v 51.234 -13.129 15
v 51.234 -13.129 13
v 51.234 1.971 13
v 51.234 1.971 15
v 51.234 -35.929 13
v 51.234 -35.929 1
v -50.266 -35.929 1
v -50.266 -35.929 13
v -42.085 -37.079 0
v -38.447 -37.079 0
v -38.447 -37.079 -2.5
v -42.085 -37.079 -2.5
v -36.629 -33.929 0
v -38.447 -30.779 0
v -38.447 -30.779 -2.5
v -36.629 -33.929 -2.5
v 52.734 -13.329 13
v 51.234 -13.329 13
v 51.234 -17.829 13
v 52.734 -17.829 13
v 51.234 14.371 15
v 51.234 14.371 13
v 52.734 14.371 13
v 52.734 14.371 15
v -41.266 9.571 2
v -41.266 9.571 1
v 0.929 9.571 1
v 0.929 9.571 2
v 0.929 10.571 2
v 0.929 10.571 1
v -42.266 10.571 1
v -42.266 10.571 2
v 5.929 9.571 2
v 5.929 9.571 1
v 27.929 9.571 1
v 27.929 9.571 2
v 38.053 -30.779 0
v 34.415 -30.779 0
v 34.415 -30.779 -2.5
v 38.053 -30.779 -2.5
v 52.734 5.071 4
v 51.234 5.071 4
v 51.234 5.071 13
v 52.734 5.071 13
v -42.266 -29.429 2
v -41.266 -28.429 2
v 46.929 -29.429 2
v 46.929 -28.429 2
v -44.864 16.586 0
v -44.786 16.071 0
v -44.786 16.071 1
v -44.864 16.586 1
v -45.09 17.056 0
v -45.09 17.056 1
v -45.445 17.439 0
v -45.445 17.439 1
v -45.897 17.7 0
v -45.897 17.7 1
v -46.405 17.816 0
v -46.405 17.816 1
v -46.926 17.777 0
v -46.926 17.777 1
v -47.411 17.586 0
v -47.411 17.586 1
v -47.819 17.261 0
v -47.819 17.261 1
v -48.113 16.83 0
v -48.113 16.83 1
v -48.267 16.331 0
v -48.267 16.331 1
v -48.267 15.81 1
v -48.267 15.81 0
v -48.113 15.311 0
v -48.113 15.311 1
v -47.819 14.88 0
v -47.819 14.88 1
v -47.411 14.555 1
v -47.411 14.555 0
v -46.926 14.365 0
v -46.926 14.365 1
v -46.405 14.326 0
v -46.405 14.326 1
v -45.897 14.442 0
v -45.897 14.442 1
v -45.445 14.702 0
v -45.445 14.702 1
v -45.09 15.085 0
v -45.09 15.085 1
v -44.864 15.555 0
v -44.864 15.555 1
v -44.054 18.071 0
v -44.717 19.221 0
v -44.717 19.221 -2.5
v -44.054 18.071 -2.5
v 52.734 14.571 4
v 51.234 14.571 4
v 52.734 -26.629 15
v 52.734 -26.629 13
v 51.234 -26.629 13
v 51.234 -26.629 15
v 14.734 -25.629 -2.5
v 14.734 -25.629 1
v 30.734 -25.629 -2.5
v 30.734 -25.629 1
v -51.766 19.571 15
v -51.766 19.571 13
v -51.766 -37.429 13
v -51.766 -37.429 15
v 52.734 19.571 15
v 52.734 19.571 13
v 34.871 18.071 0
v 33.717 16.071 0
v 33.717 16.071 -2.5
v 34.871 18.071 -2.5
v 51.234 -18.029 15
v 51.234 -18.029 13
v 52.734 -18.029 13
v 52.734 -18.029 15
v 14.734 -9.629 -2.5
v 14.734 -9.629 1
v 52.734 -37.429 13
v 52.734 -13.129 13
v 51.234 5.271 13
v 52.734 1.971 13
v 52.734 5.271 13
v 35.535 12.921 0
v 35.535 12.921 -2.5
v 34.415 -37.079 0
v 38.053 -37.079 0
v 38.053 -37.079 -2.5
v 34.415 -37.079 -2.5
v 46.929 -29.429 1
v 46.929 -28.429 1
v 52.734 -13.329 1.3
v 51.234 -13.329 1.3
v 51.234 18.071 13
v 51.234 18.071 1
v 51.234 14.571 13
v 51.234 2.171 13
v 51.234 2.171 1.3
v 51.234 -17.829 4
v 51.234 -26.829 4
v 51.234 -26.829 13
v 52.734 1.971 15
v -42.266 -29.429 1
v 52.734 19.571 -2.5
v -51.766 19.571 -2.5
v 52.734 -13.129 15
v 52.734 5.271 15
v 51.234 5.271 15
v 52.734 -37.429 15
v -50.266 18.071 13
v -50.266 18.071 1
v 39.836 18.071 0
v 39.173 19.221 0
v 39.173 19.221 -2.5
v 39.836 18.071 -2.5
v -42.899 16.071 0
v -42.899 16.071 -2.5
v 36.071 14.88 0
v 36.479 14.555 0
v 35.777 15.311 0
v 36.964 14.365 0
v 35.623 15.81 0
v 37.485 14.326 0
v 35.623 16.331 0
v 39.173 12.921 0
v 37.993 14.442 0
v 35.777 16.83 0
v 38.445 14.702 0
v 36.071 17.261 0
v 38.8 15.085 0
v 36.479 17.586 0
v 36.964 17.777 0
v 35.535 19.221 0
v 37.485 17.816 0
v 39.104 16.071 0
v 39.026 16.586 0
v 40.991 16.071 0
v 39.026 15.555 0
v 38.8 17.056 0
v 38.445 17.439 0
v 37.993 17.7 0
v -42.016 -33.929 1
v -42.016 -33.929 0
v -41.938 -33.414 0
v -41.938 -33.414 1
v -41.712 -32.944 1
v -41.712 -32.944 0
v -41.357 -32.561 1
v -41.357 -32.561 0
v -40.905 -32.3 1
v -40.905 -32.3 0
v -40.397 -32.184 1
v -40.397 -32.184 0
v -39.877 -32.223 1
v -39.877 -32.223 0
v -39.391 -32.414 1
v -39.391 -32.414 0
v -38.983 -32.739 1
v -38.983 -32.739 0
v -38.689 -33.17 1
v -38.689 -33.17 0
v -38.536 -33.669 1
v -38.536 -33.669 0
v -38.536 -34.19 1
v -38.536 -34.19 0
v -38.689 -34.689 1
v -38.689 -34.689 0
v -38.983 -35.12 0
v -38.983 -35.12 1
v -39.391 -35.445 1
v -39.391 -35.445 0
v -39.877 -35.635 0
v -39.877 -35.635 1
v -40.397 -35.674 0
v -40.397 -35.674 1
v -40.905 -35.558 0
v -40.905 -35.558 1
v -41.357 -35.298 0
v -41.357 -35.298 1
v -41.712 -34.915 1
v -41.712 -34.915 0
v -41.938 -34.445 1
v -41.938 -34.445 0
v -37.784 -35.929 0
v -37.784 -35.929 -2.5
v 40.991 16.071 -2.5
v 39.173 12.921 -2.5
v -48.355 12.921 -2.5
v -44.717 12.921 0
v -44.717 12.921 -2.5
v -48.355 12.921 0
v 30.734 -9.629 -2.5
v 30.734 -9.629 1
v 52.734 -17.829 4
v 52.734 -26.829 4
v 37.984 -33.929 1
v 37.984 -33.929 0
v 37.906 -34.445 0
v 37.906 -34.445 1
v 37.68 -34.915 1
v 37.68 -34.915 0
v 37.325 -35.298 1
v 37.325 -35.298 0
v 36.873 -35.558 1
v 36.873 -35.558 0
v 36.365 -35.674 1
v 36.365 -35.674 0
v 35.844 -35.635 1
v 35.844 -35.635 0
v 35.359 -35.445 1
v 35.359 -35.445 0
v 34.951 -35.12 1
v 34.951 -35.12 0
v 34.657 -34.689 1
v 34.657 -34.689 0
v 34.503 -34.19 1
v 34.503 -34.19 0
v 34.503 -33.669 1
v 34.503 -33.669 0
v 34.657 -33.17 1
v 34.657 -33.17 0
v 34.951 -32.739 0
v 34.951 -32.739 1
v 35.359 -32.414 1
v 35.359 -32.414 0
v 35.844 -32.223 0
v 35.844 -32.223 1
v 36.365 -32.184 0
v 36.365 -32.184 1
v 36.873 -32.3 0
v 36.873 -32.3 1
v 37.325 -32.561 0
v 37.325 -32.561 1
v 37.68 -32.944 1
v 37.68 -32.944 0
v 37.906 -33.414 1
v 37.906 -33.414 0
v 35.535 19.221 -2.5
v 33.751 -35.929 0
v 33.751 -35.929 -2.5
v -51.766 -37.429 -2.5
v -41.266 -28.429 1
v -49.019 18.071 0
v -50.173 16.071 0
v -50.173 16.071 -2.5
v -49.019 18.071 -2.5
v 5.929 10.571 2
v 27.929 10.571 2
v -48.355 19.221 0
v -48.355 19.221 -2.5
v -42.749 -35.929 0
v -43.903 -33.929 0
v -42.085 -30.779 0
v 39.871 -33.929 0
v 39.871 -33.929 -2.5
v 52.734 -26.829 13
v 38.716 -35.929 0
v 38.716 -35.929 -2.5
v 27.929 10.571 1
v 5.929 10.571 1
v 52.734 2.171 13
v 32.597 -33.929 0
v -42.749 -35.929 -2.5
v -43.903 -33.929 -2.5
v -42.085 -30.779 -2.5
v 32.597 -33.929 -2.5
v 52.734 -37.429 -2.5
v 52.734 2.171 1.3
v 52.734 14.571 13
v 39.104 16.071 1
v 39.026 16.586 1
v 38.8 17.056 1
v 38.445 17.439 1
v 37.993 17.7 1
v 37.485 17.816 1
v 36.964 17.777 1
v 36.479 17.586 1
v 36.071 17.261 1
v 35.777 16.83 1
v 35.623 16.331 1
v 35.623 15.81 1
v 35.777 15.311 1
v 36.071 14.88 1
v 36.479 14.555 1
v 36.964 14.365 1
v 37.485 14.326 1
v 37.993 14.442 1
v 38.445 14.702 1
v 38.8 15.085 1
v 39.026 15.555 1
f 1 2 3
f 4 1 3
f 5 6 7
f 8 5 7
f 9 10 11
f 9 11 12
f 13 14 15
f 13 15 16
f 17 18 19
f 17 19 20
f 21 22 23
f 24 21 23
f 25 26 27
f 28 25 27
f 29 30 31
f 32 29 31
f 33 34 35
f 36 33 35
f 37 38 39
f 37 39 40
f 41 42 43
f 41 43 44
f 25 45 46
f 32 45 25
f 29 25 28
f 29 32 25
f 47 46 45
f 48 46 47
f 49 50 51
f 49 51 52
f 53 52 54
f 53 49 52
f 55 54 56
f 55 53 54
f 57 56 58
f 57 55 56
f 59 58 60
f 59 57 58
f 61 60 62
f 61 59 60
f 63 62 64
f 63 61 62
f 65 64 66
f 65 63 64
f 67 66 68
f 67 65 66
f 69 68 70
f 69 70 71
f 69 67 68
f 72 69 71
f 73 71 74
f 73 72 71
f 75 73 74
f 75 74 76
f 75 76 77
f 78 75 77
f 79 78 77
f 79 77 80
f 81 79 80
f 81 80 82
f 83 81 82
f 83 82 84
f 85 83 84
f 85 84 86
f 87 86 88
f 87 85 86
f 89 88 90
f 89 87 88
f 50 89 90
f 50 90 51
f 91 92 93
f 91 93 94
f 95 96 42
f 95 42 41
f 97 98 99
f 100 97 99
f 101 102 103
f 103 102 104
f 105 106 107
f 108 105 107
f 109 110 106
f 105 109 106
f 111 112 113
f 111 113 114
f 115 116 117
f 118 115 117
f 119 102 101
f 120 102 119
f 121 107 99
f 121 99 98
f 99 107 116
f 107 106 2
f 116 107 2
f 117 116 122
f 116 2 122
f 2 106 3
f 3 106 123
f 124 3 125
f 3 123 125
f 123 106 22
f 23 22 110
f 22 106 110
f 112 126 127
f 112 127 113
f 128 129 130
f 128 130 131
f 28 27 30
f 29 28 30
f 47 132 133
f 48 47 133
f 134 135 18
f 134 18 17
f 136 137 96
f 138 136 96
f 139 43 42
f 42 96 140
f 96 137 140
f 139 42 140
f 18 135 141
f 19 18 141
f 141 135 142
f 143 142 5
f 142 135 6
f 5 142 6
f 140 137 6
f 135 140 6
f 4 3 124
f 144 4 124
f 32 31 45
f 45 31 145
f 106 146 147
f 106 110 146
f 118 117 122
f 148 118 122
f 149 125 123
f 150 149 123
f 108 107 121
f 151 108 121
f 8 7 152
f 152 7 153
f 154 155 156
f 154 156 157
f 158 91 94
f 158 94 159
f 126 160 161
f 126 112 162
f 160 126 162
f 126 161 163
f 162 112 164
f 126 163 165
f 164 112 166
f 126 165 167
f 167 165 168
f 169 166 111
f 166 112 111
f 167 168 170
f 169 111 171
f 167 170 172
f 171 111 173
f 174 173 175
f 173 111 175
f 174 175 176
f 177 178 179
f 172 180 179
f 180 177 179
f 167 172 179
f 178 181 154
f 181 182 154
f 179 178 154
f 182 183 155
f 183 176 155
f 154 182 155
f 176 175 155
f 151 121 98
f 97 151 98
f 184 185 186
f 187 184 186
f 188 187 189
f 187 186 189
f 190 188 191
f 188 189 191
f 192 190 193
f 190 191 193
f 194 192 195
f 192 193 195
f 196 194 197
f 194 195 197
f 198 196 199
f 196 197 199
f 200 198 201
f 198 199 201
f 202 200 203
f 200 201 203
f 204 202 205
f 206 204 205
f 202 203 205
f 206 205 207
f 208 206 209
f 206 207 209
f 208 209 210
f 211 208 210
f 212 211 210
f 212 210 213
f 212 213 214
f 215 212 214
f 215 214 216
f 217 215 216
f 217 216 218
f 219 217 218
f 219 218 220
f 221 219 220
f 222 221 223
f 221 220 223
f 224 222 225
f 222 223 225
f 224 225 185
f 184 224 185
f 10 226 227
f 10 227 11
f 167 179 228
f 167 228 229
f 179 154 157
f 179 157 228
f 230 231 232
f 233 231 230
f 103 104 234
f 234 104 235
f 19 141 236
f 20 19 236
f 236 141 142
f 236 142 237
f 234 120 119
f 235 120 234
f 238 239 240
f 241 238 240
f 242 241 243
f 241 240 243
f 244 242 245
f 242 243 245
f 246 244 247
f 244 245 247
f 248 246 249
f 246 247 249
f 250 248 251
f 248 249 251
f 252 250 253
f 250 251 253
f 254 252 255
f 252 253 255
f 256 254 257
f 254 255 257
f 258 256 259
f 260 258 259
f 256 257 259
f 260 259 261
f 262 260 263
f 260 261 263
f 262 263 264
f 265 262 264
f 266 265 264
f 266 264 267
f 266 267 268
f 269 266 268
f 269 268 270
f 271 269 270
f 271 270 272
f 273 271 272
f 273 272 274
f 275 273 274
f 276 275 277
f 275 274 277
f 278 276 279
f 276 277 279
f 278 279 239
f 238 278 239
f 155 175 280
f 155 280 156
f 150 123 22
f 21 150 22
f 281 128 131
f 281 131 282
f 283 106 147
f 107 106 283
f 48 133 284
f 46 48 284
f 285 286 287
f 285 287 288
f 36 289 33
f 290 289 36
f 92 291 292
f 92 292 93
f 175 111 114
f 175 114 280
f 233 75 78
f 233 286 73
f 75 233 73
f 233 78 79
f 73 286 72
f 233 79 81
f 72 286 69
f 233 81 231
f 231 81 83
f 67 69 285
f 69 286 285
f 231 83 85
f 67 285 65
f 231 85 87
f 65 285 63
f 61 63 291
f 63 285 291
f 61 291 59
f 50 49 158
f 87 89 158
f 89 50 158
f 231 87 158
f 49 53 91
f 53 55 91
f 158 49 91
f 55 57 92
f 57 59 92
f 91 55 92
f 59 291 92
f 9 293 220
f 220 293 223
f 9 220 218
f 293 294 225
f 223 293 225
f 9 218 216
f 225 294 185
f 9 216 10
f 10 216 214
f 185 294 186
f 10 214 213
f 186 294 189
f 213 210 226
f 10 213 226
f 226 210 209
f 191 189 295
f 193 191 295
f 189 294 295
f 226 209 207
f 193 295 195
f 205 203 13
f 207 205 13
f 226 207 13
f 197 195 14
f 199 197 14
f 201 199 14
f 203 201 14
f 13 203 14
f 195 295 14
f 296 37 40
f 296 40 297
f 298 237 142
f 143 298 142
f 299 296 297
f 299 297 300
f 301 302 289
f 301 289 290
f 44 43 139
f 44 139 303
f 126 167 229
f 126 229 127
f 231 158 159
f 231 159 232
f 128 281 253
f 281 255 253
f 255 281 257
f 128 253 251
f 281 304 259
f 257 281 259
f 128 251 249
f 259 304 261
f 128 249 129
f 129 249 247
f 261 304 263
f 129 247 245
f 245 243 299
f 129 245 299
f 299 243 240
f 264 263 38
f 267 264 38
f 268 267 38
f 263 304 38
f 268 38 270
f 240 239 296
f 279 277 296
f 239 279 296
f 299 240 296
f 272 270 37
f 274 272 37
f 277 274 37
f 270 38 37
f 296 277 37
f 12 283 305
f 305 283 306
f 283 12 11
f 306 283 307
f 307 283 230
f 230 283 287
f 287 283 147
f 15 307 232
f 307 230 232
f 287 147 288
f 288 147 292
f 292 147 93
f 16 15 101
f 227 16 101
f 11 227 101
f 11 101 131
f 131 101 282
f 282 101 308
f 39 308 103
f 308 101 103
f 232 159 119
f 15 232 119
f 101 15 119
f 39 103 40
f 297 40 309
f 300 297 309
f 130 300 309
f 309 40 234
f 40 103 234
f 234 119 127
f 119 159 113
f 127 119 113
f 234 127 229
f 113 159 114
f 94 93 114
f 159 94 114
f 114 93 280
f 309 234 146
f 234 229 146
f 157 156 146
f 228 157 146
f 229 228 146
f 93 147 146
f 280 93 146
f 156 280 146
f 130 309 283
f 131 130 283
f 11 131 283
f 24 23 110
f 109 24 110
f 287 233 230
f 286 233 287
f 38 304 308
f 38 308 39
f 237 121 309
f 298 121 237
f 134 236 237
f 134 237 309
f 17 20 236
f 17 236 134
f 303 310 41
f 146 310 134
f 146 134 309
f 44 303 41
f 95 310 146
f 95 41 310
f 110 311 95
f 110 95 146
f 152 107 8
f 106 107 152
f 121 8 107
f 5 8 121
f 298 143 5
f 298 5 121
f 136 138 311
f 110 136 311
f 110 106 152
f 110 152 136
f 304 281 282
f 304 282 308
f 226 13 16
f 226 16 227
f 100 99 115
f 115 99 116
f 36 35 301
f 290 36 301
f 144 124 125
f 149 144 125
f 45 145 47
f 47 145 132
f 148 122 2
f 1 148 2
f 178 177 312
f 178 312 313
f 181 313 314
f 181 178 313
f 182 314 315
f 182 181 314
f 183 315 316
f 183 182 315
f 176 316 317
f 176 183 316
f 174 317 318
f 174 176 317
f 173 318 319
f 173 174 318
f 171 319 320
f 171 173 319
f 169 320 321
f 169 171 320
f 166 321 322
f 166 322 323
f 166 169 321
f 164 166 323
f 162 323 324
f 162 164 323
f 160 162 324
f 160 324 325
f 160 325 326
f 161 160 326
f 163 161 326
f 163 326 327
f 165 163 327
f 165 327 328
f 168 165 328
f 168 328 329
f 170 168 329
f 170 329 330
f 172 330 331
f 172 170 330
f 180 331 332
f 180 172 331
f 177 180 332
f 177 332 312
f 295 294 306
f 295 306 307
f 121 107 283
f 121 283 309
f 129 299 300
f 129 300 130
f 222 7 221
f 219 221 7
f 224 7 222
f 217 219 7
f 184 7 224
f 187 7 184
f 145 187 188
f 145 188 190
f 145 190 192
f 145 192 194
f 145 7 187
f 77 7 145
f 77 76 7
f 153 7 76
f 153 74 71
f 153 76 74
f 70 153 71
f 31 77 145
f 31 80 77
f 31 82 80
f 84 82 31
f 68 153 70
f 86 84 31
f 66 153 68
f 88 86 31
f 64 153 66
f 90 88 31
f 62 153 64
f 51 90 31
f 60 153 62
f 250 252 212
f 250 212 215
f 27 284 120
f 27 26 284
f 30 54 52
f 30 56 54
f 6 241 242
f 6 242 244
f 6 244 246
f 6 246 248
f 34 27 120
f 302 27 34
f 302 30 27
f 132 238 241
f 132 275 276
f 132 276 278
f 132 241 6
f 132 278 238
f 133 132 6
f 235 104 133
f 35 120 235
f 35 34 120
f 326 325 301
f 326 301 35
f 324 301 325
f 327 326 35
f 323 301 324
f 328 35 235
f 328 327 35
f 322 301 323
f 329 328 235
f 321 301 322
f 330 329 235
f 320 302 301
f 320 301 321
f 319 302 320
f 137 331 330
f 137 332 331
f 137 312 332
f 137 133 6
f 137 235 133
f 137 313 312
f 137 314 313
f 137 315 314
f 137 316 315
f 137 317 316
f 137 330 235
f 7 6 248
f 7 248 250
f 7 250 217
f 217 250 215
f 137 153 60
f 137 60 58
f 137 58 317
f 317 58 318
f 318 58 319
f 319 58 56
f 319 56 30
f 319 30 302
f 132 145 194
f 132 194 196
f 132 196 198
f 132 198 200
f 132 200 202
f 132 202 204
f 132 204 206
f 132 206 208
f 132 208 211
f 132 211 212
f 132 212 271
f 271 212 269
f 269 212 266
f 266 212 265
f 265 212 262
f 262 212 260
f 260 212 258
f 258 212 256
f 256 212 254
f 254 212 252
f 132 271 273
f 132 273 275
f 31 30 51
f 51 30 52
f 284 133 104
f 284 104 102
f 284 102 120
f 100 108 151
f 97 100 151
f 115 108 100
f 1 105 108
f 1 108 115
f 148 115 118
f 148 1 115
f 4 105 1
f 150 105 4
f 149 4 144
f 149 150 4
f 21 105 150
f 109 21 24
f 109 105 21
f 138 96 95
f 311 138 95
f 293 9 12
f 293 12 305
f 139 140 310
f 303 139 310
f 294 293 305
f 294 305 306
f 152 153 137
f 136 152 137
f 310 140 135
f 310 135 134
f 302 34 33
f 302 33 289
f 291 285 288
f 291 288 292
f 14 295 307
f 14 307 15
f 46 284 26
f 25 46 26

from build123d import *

# Parameters (mm, degrees)
F0_W     = 16
F0_H     = 16
F0_W_2   = 22
F0_H_2   = 1
F0_R     = 1.75
F1_DEPTH = 1
F2_DEPTH = 2
F0_W_3   = 1.5
F0_H_3   = 3.5
F0_H_4   = 2.9
F0_H_5   = 4.5
F3_DEPTH = 13
F0_H_6   = 9.5
F0_H_7   = 9
F4_DEPTH = 4
F0_H_8   = 3
F0_H_9   = 8
F5_DEPTH = 1.3
F6_DEPTH = 2.5
F8_DEPTH = 2


with BuildPart() as f1:
    # F0 (on Top) → F1 (new body)
    with BuildSketch(Plane.XY):
        Polygon((51.2338503599, 14.5706428699), (51.2338503599, 18.0706428699), (39.8364565174, 18.0706428699), (40.9911570558, 16.0706428699), (39.1725037079, 12.9206428699), (35.535197012, 12.9206428699), (33.716543664, 16.0706428699), (34.8712442024, 18.0706428699), (-44.0535434826, 18.0706428699), (-42.8988429442, 16.0706428699), (-44.7174962921, 12.9206428699), (-48.354802988, 12.9206428699), (-50.173456336, 16.0706428699), (-49.0187557976, 18.0706428699), (-50.2661496401, 18.0706428699), (-50.2661496401, -35.9293571301), (-42.7487557976, -35.9293571301), (-43.903456336, -33.9293571301), (-42.084802988, -30.7793571301), (-38.4474962921, -30.7793571301), (-36.6288429442, -33.9293571301), (32.596543664, -33.9293571301), (34.415197012, -30.7793571301), (38.0525037079, -30.7793571301), (39.8711570558, -33.9293571301), (51.2338503599, -33.9293571301), (51.2338503599, -26.8293571301), (51.2338503599, -17.8293571301), (51.2338503599, -13.3293571301), (51.2338503599, -8.8293571301), (51.2338503599, -0.8293571301), (51.2338503599, 2.1706428699), (51.2338503599, 5.0706428699), align=None)
        with Locations((22.7338503599, -17.6293571301)):
            Rectangle(F0_W, F0_H, mode=Mode.SUBTRACT)
        Polygon((46.9291284567, -29.4293571301), (-42.2661496401, -29.4293571301), (-42.2661496401, 10.5706428699), (0.9291284567, 10.5706428699), (0.9291284567, 9.5706428699), (-41.2661496401, 9.5706428699), (-41.2661496401, -28.4293571301), (46.9291284567, -28.4293571301), align=None, mode=Mode.SUBTRACT)
        with Locations((16.9291283151, 10.0706428699)):
            Rectangle(F0_W_2, F0_H_2, mode=Mode.SUBTRACT)
        Polygon((-42.8988429442, 16.0706428699), (-44.0535434826, 18.0706428699), (-49.0187557976, 18.0706428699), (-50.173456336, 16.0706428699), (-48.354802988, 12.9206428699), (-44.7174962921, 12.9206428699), align=None)
        with Locations((-46.5361496401, 16.0706428699)):
            Circle(F0_R, mode=Mode.SUBTRACT)
        Polygon((40.9911570558, 16.0706428699), (39.8364565174, 18.0706428699), (34.8712442024, 18.0706428699), (33.716543664, 16.0706428699), (35.535197012, 12.9206428699), (39.1725037079, 12.9206428699), align=None)
        with Locations((37.3538503599, 16.0706428699)):
            Circle(F0_R, mode=Mode.SUBTRACT)
        with BuildLine():
            Line((38.7164565174, -35.9293571301), (39.8711570558, -33.9293571301))
            Line((39.8711570558, -33.9293571301), (37.9838503599, -33.9293571301))
            ThreePointArc((37.9838503599, -33.9293571301), (36.2338503599, -35.6793571301), (34.4838503599, -33.9293571301))
            Line((34.4838503599, -33.9293571301), (32.596543664, -33.9293571301))
            Line((32.596543664, -33.9293571301), (33.7512442024, -35.9293571301))
            Line((33.7512442024, -35.9293571301), (38.7164565174, -35.9293571301))
        make_face()
        with BuildLine():
            Line((37.9838503599, -33.9293571301), (39.8711570558, -33.9293571301))
            Line((39.8711570558, -33.9293571301), (38.0525037079, -30.7793571301))
            Line((38.0525037079, -30.7793571301), (34.415197012, -30.7793571301))
            Line((34.415197012, -30.7793571301), (32.596543664, -33.9293571301))
            Line((32.596543664, -33.9293571301), (34.4838503599, -33.9293571301))
            ThreePointArc((34.4838503599, -33.9293571301), (36.2338503599, -32.1793571301), (37.9838503599, -33.9293571301))
        make_face()
        with BuildLine():
            Line((-42.7487557976, -35.9293571301), (-37.7835434826, -35.9293571301))
            Line((-37.7835434826, -35.9293571301), (-36.6288429442, -33.9293571301))
            Line((-36.6288429442, -33.9293571301), (-38.5161496401, -33.9293571301))
            ThreePointArc((-38.5161496401, -33.9293571301), (-40.2661496401, -35.6793571301), (-42.0161496401, -33.9293571301))
            Line((-42.0161496401, -33.9293571301), (-43.903456336, -33.9293571301))
            Line((-43.903456336, -33.9293571301), (-42.7487557976, -35.9293571301))
        make_face()
        with BuildLine():
            Line((-38.5161496401, -33.9293571301), (-36.6288429442, -33.9293571301))
            Line((-36.6288429442, -33.9293571301), (-38.4474962921, -30.7793571301))
            Line((-38.4474962921, -30.7793571301), (-42.084802988, -30.7793571301))
            Line((-42.084802988, -30.7793571301), (-43.903456336, -33.9293571301))
            Line((-43.903456336, -33.9293571301), (-42.0161496401, -33.9293571301))
            ThreePointArc((-42.0161496401, -33.9293571301), (-40.2661496401, -32.1793571301), (-38.5161496401, -33.9293571301))
        make_face()
        Polygon((-37.7835434826, -35.9293571301), (33.7512442024, -35.9293571301), (32.596543664, -33.9293571301), (-36.6288429442, -33.9293571301), align=None)
        Polygon((51.2338503599, -35.9293571301), (51.2338503599, -33.9293571301), (39.8711570558, -33.9293571301), (38.7164565174, -35.9293571301), align=None)
    extrude(amount=F1_DEPTH)

    # F0 (on Top) → F2 (join)
    with BuildSketch(Plane.XY):
        Polygon((-42.2661496401, 10.5706428699), (-42.2661496401, -29.4293571301), (46.9291284567, -29.4293571301), (46.9291284567, -28.4293571301), (-41.2661496401, -28.4293571301), (-41.2661496401, 9.5706428699), (0.9291284567, 9.5706428699), (0.9291284567, 10.5706428699), align=None)
        with Locations((16.9291283151, 10.0706428699)):
            Rectangle(F0_W_2, F0_H_2)
    extrude(amount=F2_DEPTH)

    # F0 (on Top) → F3 (join)
    with BuildSketch(Plane.XY):
        Polygon((52.7338503599, 19.5706428699), (-51.7661496401, 19.5706428699), (-51.7661496401, -37.4293571301), (52.7338503599, -37.4293571301), (52.7338503599, -26.8293571301), (51.2338503599, -26.8293571301), (51.2338503599, -33.9293571301), (51.2338503599, -35.9293571301), (38.7164565174, -35.9293571301), (38.0525037079, -37.0793571301), (34.415197012, -37.0793571301), (33.7512442024, -35.9293571301), (-37.7835434826, -35.9293571301), (-38.4474962921, -37.0793571301), (-42.084802988, -37.0793571301), (-42.7487557976, -35.9293571301), (-50.2661496401, -35.9293571301), (-50.2661496401, 18.0706428699), (-49.0187557976, 18.0706428699), (-48.354802988, 19.2206428699), (-44.7174962921, 19.2206428699), (-44.0535434826, 18.0706428699), (34.8712442024, 18.0706428699), (35.535197012, 19.2206428699), (39.1725037079, 19.2206428699), (39.8364565174, 18.0706428699), (51.2338503599, 18.0706428699), (52.7338503599, 18.0706428699), align=None)
        with Locations((51.9838503599, 16.3206428699)):
            Rectangle(F0_W_3, F0_H_3)
        with Locations((51.9838503599, 3.6206428699)):
            Rectangle(F0_W_3, F0_H_4)
        with Locations((51.9838503599, -15.5793571301)):
            Rectangle(F0_W_3, F0_H_5)
        Polygon((38.0525037079, -37.0793571301), (38.7164565174, -35.9293571301), (33.7512442024, -35.9293571301), (34.415197012, -37.0793571301), align=None)
        Polygon((-38.4474962921, -37.0793571301), (-37.7835434826, -35.9293571301), (-42.7487557976, -35.9293571301), (-42.084802988, -37.0793571301), align=None)
        Polygon((34.8712442024, 18.0706428699), (39.8364565174, 18.0706428699), (39.1725037079, 19.2206428699), (35.535197012, 19.2206428699), align=None)
        Polygon((-49.0187557976, 18.0706428699), (-44.0535434826, 18.0706428699), (-44.7174962921, 19.2206428699), (-48.354802988, 19.2206428699), align=None)
    extrude(amount=F3_DEPTH)

    # F0 (on Top) → F4 (join)
    with BuildSketch(Plane.XY):
        with Locations((51.9838503599, 9.8206428699)):
            Rectangle(F0_W_3, F0_H_6)
        with Locations((51.9838503599, -22.3293571301)):
            Rectangle(F0_W_3, F0_H_7)
    extrude(amount=F4_DEPTH)

    # F0 (on Top) → F5 (join)
    with BuildSketch(Plane.XY):
        with Locations((51.9838503599, 0.6706428699)):
            Rectangle(F0_W_3, F0_H_8)
        with Locations((51.9838503599, -4.8293571301)):
            Rectangle(F0_W_3, F0_H_9)
        with Locations((51.9838503599, -11.0793571301)):
            Rectangle(F0_W_3, F0_H_5)
    extrude(amount=F5_DEPTH)

    # F0 (on Top) → F6 (join)
    with BuildSketch(Plane.XY):
        Polygon((52.7338503599, 19.5706428699), (-51.7661496401, 19.5706428699), (-51.7661496401, -37.4293571301), (52.7338503599, -37.4293571301), (52.7338503599, -26.8293571301), (51.2338503599, -26.8293571301), (51.2338503599, -33.9293571301), (51.2338503599, -35.9293571301), (38.7164565174, -35.9293571301), (38.0525037079, -37.0793571301), (34.415197012, -37.0793571301), (33.7512442024, -35.9293571301), (-37.7835434826, -35.9293571301), (-38.4474962921, -37.0793571301), (-42.084802988, -37.0793571301), (-42.7487557976, -35.9293571301), (-50.2661496401, -35.9293571301), (-50.2661496401, 18.0706428699), (-49.0187557976, 18.0706428699), (-48.354802988, 19.2206428699), (-44.7174962921, 19.2206428699), (-44.0535434826, 18.0706428699), (34.8712442024, 18.0706428699), (35.535197012, 19.2206428699), (39.1725037079, 19.2206428699), (39.8364565174, 18.0706428699), (51.2338503599, 18.0706428699), (52.7338503599, 18.0706428699), align=None)
        with Locations((51.9838503599, 16.3206428699)):
            Rectangle(F0_W_3, F0_H_3)
        with Locations((51.9838503599, 9.8206428699)):
            Rectangle(F0_W_3, F0_H_6)
        with Locations((51.9838503599, 3.6206428699)):
            Rectangle(F0_W_3, F0_H_4)
        with Locations((51.9838503599, 0.6706428699)):
            Rectangle(F0_W_3, F0_H_8)
        with Locations((51.9838503599, -4.8293571301)):
            Rectangle(F0_W_3, F0_H_9)
        with Locations((51.9838503599, -11.0793571301)):
            Rectangle(F0_W_3, F0_H_5)
        with Locations((51.9838503599, -15.5793571301)):
            Rectangle(F0_W_3, F0_H_5)
        with Locations((51.9838503599, -22.3293571301)):
            Rectangle(F0_W_3, F0_H_7)
        Polygon((51.2338503599, -35.9293571301), (51.2338503599, -33.9293571301), (39.8711570558, -33.9293571301), (38.7164565174, -35.9293571301), align=None)
        Polygon((-37.7835434826, -35.9293571301), (33.7512442024, -35.9293571301), (32.596543664, -33.9293571301), (-36.6288429442, -33.9293571301), align=None)
        Polygon((51.2338503599, 14.5706428699), (51.2338503599, 18.0706428699), (39.8364565174, 18.0706428699), (40.9911570558, 16.0706428699), (39.1725037079, 12.9206428699), (35.535197012, 12.9206428699), (33.716543664, 16.0706428699), (34.8712442024, 18.0706428699), (-44.0535434826, 18.0706428699), (-42.8988429442, 16.0706428699), (-44.7174962921, 12.9206428699), (-48.354802988, 12.9206428699), (-50.173456336, 16.0706428699), (-49.0187557976, 18.0706428699), (-50.2661496401, 18.0706428699), (-50.2661496401, -35.9293571301), (-42.7487557976, -35.9293571301), (-43.903456336, -33.9293571301), (-42.084802988, -30.7793571301), (-38.4474962921, -30.7793571301), (-36.6288429442, -33.9293571301), (32.596543664, -33.9293571301), (34.415197012, -30.7793571301), (38.0525037079, -30.7793571301), (39.8711570558, -33.9293571301), (51.2338503599, -33.9293571301), (51.2338503599, -26.8293571301), (51.2338503599, -17.8293571301), (51.2338503599, -13.3293571301), (51.2338503599, -8.8293571301), (51.2338503599, -0.8293571301), (51.2338503599, 2.1706428699), (51.2338503599, 5.0706428699), align=None)
        with Locations((22.7338503599, -17.6293571301)):
            Rectangle(F0_W, F0_H, mode=Mode.SUBTRACT)
        Polygon((46.9291284567, -29.4293571301), (-42.2661496401, -29.4293571301), (-42.2661496401, 10.5706428699), (0.9291284567, 10.5706428699), (0.9291284567, 9.5706428699), (-41.2661496401, 9.5706428699), (-41.2661496401, -28.4293571301), (46.9291284567, -28.4293571301), align=None, mode=Mode.SUBTRACT)
        with Locations((16.9291283151, 10.0706428699)):
            Rectangle(F0_W_2, F0_H_2, mode=Mode.SUBTRACT)
        with Locations((16.9291283151, 10.0706428699)):
            Rectangle(F0_W_2, F0_H_2)
        Polygon((-42.2661496401, 10.5706428699), (-42.2661496401, -29.4293571301), (46.9291284567, -29.4293571301), (46.9291284567, -28.4293571301), (-41.2661496401, -28.4293571301), (-41.2661496401, 9.5706428699), (0.9291284567, 9.5706428699), (0.9291284567, 10.5706428699), align=None)
    extrude(amount=-F6_DEPTH)


with BuildPart() as f8:
    # F7 (on face) → F8 (new body)
    with BuildSketch(Plane.XY.offset(13)):
        Polygon((52.7338503599, 14.3706428699), (52.7338503599, 14.5706428699), (51.2338503599, 14.5706428699), (51.2338503599, 18.0706428699), (-50.2661496401, 18.0706428699), (-50.2661496401, -35.9293571301), (51.2338503599, -35.9293571301), (51.2338503599, -26.8293571301), (52.7338503599, -26.8293571301), (52.7338503599, -26.6293571301), (51.2338503599, -26.6293571301), (51.2338503599, -18.0293571301), (52.7338503599, -18.0293571301), (52.7338503599, -13.1293571301), (51.2338503599, -13.1293571301), (51.2338503599, 1.9706428699), (52.7338503599, 1.9706428699), (52.7338503599, 5.2706428699), (51.2338503599, 5.2706428699), (51.2338503599, 14.3706428699), align=None)
        Polygon((52.7338503599, 19.5706428699), (-51.7661496401, 19.5706428699), (-51.7661496401, -37.4293571301), (52.7338503599, -37.4293571301), (52.7338503599, -26.8293571301), (51.2338503599, -26.8293571301), (51.2338503599, -35.9293571301), (-50.2661496401, -35.9293571301), (-50.2661496401, 18.0706428699), (51.2338503599, 18.0706428699), (51.2338503599, 14.5706428699), (52.7338503599, 14.5706428699), align=None)
    extrude(amount=F8_DEPTH)


solid = Compound([f1.part, f8.part])
